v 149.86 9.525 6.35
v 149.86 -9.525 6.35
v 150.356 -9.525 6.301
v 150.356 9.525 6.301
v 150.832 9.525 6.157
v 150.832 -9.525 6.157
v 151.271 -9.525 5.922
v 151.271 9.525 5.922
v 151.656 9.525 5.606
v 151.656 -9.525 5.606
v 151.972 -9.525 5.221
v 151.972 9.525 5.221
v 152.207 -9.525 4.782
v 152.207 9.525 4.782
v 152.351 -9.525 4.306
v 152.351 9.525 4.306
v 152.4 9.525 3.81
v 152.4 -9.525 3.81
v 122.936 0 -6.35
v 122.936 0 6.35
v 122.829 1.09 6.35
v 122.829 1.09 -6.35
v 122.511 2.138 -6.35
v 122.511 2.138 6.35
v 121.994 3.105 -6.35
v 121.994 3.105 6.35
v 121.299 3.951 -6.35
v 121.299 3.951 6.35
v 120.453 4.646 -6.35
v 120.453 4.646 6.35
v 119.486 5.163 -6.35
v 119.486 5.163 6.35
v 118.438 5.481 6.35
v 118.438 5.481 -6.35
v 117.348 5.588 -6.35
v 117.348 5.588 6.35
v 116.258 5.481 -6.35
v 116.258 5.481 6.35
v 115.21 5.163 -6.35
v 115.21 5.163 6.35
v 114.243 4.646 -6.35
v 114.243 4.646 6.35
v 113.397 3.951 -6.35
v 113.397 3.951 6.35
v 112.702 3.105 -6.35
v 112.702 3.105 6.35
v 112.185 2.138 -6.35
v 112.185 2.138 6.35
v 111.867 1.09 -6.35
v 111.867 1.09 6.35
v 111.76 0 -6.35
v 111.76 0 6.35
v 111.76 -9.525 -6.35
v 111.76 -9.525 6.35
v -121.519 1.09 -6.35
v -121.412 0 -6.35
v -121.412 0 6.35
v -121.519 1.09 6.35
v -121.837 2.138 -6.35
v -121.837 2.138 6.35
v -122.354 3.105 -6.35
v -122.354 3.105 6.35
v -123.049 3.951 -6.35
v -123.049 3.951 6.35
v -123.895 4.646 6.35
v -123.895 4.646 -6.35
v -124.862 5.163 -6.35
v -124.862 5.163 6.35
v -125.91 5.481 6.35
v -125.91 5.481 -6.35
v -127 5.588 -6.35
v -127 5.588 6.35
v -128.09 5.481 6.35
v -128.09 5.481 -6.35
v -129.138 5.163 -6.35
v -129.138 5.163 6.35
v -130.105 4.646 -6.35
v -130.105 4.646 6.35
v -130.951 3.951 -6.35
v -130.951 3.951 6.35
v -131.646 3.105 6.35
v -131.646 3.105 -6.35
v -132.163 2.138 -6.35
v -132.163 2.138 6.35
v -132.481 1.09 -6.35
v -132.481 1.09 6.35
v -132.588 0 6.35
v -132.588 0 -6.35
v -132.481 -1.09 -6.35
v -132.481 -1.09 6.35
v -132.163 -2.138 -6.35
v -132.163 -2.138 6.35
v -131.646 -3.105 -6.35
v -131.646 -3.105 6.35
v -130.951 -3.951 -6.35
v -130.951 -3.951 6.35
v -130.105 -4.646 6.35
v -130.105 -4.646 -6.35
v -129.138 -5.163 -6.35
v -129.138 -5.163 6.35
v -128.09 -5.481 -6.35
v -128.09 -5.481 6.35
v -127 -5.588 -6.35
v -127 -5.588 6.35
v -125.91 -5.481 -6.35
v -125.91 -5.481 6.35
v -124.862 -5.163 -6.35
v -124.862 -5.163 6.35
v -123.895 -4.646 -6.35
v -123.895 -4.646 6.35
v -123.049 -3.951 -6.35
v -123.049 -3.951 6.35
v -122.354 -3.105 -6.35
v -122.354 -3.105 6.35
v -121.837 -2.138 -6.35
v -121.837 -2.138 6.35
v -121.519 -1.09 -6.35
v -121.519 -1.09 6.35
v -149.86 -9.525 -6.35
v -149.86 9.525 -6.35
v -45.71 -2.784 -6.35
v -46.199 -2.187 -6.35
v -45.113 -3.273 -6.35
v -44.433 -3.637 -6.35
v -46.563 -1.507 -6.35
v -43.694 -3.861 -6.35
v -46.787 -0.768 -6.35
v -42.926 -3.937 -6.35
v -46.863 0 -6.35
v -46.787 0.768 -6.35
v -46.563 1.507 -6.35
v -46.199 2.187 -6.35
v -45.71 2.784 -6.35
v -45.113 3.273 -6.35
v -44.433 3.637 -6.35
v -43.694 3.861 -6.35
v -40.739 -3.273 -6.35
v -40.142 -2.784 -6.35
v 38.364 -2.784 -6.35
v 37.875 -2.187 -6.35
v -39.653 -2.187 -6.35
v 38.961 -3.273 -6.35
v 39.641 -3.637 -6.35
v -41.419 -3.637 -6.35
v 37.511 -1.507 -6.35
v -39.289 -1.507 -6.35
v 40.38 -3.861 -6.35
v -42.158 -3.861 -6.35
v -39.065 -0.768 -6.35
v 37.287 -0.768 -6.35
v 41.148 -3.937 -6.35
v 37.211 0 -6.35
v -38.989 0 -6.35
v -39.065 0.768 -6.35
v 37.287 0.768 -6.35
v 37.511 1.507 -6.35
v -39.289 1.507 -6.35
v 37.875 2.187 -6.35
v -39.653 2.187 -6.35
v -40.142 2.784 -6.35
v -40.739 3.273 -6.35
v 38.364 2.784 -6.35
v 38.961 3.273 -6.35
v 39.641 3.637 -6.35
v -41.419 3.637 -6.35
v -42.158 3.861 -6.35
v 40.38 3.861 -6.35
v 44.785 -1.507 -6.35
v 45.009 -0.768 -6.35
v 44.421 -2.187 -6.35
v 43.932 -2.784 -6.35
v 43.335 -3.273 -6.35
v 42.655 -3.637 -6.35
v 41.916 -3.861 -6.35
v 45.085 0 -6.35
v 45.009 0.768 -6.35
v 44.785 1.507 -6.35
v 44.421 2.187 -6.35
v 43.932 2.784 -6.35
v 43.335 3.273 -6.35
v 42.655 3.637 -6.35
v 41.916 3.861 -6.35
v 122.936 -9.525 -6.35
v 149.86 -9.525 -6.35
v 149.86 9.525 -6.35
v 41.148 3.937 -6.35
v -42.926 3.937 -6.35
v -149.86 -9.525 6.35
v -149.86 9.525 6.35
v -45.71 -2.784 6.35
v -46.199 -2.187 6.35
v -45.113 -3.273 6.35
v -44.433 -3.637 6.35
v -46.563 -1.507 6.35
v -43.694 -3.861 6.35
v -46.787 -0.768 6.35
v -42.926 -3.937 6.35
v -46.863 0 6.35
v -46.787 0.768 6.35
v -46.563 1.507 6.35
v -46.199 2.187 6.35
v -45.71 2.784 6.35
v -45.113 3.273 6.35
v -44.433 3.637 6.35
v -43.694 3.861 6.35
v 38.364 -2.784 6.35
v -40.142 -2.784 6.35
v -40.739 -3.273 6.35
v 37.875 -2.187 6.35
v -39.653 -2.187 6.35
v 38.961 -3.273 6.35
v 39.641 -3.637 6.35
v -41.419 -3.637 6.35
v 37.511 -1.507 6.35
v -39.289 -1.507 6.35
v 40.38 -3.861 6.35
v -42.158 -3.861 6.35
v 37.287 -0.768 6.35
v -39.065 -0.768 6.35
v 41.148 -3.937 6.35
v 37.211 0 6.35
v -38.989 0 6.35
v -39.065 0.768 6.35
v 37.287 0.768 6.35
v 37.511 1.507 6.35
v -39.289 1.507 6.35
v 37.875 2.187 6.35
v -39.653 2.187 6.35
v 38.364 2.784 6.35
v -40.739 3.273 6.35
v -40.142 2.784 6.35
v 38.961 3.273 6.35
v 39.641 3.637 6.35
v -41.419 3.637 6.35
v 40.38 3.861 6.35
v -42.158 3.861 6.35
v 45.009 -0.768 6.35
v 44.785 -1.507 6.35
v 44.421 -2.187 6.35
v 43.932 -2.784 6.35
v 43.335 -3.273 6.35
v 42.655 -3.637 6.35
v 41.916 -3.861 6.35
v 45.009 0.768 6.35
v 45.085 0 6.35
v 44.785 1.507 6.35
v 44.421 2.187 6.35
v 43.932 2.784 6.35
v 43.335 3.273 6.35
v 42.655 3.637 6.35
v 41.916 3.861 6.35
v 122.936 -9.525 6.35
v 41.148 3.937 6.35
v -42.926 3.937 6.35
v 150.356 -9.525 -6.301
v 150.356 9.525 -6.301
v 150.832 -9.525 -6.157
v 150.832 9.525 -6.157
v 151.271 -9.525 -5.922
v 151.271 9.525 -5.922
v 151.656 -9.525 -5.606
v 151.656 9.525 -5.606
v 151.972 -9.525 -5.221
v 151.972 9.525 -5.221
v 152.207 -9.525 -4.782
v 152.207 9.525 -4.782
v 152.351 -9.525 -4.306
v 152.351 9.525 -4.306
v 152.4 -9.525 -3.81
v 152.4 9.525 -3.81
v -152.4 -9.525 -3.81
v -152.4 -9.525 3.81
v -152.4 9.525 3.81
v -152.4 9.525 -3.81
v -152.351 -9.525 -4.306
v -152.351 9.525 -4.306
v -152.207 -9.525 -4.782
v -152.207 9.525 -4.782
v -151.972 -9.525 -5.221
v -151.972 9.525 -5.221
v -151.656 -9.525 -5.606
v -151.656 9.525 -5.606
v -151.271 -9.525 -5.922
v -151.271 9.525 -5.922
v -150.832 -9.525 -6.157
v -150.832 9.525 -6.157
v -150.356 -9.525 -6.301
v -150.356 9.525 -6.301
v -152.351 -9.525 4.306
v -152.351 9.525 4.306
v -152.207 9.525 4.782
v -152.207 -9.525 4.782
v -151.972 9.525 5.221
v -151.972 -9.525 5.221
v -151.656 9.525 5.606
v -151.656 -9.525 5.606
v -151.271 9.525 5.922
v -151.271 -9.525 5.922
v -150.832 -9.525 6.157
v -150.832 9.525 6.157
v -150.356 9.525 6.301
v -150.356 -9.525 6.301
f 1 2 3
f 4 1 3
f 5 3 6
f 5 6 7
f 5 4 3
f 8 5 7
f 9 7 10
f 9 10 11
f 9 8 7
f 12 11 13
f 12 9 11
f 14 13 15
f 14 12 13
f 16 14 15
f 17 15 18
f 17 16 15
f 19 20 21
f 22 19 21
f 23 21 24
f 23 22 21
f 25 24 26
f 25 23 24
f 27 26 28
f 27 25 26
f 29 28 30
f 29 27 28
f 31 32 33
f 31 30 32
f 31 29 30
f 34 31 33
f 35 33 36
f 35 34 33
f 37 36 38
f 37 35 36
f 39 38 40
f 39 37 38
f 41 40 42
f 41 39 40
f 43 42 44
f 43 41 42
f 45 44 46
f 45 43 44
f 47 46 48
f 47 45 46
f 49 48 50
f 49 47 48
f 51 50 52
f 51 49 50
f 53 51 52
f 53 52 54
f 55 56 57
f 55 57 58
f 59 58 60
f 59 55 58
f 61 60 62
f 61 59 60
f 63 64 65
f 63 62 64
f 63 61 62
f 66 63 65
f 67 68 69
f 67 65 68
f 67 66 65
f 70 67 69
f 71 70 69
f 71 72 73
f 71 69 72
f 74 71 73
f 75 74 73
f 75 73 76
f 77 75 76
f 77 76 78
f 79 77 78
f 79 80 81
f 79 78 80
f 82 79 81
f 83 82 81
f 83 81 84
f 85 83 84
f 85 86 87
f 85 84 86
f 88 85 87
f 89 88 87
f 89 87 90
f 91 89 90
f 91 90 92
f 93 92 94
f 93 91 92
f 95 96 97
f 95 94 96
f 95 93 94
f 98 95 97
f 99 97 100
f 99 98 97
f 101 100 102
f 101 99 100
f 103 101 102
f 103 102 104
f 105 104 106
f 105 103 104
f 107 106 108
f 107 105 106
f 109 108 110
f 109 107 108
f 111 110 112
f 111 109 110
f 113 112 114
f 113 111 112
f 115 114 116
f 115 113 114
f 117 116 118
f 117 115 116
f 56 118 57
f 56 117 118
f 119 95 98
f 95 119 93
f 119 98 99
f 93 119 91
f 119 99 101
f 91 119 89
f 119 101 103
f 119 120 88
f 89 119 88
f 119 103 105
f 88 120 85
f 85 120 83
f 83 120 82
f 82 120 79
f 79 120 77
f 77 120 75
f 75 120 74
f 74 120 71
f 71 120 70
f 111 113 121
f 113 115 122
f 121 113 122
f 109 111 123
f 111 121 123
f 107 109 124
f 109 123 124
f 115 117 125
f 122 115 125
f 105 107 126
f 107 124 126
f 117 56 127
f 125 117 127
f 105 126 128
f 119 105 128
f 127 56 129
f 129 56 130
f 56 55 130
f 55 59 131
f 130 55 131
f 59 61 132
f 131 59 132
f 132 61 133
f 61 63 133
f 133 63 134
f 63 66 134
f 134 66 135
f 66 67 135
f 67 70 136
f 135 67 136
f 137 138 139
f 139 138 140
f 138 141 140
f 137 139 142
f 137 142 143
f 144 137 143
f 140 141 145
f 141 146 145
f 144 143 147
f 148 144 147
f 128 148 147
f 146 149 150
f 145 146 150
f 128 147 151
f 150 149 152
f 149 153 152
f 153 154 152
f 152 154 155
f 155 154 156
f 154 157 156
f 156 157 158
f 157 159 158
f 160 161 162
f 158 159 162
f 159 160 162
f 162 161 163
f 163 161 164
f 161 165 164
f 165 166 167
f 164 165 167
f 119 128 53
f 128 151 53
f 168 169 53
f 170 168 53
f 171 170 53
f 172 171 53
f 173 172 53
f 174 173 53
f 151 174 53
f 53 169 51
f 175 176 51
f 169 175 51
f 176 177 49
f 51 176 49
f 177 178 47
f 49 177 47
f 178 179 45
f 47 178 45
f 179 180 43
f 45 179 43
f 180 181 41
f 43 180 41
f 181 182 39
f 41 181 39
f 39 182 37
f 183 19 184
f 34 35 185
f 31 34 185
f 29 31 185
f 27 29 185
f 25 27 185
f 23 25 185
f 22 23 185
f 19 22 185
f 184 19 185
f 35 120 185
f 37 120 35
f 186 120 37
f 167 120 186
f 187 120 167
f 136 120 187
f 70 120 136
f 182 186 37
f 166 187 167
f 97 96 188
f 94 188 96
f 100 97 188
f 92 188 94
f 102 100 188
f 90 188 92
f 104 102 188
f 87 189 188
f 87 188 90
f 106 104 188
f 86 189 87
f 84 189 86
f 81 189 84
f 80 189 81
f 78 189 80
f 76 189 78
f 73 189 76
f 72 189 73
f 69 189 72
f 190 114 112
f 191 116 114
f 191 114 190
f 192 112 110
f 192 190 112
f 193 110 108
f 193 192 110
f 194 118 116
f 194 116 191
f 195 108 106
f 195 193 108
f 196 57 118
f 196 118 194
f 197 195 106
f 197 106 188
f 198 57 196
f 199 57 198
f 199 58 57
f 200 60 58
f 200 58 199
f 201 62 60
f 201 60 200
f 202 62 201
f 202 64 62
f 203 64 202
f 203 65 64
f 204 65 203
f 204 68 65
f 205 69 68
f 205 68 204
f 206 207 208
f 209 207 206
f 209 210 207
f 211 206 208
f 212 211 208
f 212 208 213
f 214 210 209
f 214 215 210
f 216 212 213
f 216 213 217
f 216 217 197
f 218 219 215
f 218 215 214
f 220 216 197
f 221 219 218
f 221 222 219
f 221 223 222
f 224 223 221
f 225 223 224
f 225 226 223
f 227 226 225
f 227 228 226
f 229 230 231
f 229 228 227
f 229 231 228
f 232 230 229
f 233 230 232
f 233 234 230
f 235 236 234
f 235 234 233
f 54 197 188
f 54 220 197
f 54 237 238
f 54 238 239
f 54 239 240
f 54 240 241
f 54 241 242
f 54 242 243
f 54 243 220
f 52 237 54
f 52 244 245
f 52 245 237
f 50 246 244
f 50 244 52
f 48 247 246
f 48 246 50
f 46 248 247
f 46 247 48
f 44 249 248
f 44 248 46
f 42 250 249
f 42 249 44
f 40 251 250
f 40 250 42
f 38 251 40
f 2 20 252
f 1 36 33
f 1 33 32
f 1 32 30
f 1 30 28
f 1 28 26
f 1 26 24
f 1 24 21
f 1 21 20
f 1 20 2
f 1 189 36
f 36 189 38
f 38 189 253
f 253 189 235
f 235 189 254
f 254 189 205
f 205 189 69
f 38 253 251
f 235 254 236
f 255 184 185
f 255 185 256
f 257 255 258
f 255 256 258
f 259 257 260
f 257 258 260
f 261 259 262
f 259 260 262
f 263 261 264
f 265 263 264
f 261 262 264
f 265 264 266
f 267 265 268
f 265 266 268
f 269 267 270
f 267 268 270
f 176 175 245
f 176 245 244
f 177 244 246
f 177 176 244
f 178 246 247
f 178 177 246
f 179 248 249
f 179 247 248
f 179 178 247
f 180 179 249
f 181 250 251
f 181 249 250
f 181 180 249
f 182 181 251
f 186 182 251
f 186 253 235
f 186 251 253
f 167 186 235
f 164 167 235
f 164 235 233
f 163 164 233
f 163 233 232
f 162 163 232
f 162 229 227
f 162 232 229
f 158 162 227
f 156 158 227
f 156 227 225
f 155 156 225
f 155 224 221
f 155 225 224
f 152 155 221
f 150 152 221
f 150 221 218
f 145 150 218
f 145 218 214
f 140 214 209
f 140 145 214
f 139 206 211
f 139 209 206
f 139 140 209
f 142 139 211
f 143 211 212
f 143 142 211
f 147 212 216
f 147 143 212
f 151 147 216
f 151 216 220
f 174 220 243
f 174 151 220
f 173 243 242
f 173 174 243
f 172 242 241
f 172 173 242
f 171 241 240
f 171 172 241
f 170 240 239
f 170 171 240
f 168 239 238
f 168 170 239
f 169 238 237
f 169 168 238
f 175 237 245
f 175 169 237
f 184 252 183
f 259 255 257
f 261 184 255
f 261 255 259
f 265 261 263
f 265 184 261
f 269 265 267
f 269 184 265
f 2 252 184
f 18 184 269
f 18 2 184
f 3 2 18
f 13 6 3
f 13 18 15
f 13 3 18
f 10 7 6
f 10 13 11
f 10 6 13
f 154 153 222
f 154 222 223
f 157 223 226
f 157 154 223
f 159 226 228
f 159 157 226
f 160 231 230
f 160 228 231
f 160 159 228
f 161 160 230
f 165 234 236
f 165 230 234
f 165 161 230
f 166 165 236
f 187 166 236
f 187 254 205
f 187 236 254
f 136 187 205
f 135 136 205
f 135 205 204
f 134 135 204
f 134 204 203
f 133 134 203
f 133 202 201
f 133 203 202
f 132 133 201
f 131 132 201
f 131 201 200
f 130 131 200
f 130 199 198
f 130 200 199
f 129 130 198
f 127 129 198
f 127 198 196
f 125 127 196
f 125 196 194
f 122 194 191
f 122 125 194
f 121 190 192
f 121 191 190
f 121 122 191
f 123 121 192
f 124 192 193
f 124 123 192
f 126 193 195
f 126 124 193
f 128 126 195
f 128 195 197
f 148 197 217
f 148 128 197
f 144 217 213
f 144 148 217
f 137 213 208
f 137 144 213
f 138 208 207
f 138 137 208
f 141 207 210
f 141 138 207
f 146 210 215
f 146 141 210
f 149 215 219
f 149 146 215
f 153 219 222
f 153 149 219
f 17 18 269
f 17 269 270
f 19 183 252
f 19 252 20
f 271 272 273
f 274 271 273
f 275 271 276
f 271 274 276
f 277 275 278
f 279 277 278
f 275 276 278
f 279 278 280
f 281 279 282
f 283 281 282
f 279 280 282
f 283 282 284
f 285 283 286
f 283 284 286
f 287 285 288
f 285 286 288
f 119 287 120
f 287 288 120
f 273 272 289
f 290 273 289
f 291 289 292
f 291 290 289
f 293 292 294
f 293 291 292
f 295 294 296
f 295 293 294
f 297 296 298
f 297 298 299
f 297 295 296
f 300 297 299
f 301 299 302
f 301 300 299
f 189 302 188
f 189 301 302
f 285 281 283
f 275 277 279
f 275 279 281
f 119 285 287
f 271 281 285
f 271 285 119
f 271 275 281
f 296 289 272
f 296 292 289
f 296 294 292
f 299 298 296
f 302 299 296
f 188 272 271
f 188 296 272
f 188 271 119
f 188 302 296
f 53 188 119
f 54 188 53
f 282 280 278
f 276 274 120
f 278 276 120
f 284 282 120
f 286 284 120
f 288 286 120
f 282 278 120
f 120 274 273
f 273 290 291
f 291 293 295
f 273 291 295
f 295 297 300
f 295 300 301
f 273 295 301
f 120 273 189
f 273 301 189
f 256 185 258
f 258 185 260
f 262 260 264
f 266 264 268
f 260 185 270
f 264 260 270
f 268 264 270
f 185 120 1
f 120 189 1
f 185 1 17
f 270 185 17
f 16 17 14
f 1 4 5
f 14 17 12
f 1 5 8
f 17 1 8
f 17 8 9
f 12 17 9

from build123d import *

# Parameters (mm, degrees)
SKETCH1_W               = 304.8
SKETCH1_H               = 19.05
BOSS_EXTRUDE1_DEPTH     = 6.35
CUT_EXTRUDE1_DEPTH      = 154.224592103
CUT_EXTRUDE1_DEPTH_BACK = 154.224592103
SKETCH2_R               = 5.588
SKETCH2_R_2             = 3.937
FILLET1_R               = 2.54


with BuildPart() as part:
    # Sketch1 → Boss-Extrude1 (new, symmetric)
    with BuildSketch(Plane.XY):
        Rectangle(SKETCH1_W, SKETCH1_H)
    extrude(amount=BOSS_EXTRUDE1_DEPTH, both=True)

    # Sketch2 → Cut-Extrude1 (cut, two sides: drawn at the far end of the back side and taken through both)
    with BuildSketch(Plane.XY.offset(6.35).offset(-CUT_EXTRUDE1_DEPTH_BACK)):
        with BuildLine():
            Line((122.936, -9.525), (122.936, 0))
            ThreePointArc((122.936, 0), (117.348, 5.588), (111.76, 0))
            Line((111.76, 0), (111.76, -9.525))
            Line((111.76, -9.525), (122.936, -9.525))
        make_face()
        with Locations((-127, 0)):
            Circle(SKETCH2_R)
        with Locations((-42.926, 0)):
            Circle(SKETCH2_R_2)
        with Locations((41.148, 0)):
            Circle(SKETCH2_R_2)
    extrude(amount=CUT_EXTRUDE1_DEPTH + CUT_EXTRUDE1_DEPTH_BACK, mode=Mode.SUBTRACT)

    # Fillet1
    fillet1_edges = [part.edges().sort_by_distance(p)[0] for p in [
        (-152.4, 0, 6.35),
        (152.4, 0, 6.35),
        (-152.4, 0, -6.35),
        (152.4, 0, -6.35),
    ]]
    fillet(fillet1_edges, radius=FILLET1_R)


solid = part.part
